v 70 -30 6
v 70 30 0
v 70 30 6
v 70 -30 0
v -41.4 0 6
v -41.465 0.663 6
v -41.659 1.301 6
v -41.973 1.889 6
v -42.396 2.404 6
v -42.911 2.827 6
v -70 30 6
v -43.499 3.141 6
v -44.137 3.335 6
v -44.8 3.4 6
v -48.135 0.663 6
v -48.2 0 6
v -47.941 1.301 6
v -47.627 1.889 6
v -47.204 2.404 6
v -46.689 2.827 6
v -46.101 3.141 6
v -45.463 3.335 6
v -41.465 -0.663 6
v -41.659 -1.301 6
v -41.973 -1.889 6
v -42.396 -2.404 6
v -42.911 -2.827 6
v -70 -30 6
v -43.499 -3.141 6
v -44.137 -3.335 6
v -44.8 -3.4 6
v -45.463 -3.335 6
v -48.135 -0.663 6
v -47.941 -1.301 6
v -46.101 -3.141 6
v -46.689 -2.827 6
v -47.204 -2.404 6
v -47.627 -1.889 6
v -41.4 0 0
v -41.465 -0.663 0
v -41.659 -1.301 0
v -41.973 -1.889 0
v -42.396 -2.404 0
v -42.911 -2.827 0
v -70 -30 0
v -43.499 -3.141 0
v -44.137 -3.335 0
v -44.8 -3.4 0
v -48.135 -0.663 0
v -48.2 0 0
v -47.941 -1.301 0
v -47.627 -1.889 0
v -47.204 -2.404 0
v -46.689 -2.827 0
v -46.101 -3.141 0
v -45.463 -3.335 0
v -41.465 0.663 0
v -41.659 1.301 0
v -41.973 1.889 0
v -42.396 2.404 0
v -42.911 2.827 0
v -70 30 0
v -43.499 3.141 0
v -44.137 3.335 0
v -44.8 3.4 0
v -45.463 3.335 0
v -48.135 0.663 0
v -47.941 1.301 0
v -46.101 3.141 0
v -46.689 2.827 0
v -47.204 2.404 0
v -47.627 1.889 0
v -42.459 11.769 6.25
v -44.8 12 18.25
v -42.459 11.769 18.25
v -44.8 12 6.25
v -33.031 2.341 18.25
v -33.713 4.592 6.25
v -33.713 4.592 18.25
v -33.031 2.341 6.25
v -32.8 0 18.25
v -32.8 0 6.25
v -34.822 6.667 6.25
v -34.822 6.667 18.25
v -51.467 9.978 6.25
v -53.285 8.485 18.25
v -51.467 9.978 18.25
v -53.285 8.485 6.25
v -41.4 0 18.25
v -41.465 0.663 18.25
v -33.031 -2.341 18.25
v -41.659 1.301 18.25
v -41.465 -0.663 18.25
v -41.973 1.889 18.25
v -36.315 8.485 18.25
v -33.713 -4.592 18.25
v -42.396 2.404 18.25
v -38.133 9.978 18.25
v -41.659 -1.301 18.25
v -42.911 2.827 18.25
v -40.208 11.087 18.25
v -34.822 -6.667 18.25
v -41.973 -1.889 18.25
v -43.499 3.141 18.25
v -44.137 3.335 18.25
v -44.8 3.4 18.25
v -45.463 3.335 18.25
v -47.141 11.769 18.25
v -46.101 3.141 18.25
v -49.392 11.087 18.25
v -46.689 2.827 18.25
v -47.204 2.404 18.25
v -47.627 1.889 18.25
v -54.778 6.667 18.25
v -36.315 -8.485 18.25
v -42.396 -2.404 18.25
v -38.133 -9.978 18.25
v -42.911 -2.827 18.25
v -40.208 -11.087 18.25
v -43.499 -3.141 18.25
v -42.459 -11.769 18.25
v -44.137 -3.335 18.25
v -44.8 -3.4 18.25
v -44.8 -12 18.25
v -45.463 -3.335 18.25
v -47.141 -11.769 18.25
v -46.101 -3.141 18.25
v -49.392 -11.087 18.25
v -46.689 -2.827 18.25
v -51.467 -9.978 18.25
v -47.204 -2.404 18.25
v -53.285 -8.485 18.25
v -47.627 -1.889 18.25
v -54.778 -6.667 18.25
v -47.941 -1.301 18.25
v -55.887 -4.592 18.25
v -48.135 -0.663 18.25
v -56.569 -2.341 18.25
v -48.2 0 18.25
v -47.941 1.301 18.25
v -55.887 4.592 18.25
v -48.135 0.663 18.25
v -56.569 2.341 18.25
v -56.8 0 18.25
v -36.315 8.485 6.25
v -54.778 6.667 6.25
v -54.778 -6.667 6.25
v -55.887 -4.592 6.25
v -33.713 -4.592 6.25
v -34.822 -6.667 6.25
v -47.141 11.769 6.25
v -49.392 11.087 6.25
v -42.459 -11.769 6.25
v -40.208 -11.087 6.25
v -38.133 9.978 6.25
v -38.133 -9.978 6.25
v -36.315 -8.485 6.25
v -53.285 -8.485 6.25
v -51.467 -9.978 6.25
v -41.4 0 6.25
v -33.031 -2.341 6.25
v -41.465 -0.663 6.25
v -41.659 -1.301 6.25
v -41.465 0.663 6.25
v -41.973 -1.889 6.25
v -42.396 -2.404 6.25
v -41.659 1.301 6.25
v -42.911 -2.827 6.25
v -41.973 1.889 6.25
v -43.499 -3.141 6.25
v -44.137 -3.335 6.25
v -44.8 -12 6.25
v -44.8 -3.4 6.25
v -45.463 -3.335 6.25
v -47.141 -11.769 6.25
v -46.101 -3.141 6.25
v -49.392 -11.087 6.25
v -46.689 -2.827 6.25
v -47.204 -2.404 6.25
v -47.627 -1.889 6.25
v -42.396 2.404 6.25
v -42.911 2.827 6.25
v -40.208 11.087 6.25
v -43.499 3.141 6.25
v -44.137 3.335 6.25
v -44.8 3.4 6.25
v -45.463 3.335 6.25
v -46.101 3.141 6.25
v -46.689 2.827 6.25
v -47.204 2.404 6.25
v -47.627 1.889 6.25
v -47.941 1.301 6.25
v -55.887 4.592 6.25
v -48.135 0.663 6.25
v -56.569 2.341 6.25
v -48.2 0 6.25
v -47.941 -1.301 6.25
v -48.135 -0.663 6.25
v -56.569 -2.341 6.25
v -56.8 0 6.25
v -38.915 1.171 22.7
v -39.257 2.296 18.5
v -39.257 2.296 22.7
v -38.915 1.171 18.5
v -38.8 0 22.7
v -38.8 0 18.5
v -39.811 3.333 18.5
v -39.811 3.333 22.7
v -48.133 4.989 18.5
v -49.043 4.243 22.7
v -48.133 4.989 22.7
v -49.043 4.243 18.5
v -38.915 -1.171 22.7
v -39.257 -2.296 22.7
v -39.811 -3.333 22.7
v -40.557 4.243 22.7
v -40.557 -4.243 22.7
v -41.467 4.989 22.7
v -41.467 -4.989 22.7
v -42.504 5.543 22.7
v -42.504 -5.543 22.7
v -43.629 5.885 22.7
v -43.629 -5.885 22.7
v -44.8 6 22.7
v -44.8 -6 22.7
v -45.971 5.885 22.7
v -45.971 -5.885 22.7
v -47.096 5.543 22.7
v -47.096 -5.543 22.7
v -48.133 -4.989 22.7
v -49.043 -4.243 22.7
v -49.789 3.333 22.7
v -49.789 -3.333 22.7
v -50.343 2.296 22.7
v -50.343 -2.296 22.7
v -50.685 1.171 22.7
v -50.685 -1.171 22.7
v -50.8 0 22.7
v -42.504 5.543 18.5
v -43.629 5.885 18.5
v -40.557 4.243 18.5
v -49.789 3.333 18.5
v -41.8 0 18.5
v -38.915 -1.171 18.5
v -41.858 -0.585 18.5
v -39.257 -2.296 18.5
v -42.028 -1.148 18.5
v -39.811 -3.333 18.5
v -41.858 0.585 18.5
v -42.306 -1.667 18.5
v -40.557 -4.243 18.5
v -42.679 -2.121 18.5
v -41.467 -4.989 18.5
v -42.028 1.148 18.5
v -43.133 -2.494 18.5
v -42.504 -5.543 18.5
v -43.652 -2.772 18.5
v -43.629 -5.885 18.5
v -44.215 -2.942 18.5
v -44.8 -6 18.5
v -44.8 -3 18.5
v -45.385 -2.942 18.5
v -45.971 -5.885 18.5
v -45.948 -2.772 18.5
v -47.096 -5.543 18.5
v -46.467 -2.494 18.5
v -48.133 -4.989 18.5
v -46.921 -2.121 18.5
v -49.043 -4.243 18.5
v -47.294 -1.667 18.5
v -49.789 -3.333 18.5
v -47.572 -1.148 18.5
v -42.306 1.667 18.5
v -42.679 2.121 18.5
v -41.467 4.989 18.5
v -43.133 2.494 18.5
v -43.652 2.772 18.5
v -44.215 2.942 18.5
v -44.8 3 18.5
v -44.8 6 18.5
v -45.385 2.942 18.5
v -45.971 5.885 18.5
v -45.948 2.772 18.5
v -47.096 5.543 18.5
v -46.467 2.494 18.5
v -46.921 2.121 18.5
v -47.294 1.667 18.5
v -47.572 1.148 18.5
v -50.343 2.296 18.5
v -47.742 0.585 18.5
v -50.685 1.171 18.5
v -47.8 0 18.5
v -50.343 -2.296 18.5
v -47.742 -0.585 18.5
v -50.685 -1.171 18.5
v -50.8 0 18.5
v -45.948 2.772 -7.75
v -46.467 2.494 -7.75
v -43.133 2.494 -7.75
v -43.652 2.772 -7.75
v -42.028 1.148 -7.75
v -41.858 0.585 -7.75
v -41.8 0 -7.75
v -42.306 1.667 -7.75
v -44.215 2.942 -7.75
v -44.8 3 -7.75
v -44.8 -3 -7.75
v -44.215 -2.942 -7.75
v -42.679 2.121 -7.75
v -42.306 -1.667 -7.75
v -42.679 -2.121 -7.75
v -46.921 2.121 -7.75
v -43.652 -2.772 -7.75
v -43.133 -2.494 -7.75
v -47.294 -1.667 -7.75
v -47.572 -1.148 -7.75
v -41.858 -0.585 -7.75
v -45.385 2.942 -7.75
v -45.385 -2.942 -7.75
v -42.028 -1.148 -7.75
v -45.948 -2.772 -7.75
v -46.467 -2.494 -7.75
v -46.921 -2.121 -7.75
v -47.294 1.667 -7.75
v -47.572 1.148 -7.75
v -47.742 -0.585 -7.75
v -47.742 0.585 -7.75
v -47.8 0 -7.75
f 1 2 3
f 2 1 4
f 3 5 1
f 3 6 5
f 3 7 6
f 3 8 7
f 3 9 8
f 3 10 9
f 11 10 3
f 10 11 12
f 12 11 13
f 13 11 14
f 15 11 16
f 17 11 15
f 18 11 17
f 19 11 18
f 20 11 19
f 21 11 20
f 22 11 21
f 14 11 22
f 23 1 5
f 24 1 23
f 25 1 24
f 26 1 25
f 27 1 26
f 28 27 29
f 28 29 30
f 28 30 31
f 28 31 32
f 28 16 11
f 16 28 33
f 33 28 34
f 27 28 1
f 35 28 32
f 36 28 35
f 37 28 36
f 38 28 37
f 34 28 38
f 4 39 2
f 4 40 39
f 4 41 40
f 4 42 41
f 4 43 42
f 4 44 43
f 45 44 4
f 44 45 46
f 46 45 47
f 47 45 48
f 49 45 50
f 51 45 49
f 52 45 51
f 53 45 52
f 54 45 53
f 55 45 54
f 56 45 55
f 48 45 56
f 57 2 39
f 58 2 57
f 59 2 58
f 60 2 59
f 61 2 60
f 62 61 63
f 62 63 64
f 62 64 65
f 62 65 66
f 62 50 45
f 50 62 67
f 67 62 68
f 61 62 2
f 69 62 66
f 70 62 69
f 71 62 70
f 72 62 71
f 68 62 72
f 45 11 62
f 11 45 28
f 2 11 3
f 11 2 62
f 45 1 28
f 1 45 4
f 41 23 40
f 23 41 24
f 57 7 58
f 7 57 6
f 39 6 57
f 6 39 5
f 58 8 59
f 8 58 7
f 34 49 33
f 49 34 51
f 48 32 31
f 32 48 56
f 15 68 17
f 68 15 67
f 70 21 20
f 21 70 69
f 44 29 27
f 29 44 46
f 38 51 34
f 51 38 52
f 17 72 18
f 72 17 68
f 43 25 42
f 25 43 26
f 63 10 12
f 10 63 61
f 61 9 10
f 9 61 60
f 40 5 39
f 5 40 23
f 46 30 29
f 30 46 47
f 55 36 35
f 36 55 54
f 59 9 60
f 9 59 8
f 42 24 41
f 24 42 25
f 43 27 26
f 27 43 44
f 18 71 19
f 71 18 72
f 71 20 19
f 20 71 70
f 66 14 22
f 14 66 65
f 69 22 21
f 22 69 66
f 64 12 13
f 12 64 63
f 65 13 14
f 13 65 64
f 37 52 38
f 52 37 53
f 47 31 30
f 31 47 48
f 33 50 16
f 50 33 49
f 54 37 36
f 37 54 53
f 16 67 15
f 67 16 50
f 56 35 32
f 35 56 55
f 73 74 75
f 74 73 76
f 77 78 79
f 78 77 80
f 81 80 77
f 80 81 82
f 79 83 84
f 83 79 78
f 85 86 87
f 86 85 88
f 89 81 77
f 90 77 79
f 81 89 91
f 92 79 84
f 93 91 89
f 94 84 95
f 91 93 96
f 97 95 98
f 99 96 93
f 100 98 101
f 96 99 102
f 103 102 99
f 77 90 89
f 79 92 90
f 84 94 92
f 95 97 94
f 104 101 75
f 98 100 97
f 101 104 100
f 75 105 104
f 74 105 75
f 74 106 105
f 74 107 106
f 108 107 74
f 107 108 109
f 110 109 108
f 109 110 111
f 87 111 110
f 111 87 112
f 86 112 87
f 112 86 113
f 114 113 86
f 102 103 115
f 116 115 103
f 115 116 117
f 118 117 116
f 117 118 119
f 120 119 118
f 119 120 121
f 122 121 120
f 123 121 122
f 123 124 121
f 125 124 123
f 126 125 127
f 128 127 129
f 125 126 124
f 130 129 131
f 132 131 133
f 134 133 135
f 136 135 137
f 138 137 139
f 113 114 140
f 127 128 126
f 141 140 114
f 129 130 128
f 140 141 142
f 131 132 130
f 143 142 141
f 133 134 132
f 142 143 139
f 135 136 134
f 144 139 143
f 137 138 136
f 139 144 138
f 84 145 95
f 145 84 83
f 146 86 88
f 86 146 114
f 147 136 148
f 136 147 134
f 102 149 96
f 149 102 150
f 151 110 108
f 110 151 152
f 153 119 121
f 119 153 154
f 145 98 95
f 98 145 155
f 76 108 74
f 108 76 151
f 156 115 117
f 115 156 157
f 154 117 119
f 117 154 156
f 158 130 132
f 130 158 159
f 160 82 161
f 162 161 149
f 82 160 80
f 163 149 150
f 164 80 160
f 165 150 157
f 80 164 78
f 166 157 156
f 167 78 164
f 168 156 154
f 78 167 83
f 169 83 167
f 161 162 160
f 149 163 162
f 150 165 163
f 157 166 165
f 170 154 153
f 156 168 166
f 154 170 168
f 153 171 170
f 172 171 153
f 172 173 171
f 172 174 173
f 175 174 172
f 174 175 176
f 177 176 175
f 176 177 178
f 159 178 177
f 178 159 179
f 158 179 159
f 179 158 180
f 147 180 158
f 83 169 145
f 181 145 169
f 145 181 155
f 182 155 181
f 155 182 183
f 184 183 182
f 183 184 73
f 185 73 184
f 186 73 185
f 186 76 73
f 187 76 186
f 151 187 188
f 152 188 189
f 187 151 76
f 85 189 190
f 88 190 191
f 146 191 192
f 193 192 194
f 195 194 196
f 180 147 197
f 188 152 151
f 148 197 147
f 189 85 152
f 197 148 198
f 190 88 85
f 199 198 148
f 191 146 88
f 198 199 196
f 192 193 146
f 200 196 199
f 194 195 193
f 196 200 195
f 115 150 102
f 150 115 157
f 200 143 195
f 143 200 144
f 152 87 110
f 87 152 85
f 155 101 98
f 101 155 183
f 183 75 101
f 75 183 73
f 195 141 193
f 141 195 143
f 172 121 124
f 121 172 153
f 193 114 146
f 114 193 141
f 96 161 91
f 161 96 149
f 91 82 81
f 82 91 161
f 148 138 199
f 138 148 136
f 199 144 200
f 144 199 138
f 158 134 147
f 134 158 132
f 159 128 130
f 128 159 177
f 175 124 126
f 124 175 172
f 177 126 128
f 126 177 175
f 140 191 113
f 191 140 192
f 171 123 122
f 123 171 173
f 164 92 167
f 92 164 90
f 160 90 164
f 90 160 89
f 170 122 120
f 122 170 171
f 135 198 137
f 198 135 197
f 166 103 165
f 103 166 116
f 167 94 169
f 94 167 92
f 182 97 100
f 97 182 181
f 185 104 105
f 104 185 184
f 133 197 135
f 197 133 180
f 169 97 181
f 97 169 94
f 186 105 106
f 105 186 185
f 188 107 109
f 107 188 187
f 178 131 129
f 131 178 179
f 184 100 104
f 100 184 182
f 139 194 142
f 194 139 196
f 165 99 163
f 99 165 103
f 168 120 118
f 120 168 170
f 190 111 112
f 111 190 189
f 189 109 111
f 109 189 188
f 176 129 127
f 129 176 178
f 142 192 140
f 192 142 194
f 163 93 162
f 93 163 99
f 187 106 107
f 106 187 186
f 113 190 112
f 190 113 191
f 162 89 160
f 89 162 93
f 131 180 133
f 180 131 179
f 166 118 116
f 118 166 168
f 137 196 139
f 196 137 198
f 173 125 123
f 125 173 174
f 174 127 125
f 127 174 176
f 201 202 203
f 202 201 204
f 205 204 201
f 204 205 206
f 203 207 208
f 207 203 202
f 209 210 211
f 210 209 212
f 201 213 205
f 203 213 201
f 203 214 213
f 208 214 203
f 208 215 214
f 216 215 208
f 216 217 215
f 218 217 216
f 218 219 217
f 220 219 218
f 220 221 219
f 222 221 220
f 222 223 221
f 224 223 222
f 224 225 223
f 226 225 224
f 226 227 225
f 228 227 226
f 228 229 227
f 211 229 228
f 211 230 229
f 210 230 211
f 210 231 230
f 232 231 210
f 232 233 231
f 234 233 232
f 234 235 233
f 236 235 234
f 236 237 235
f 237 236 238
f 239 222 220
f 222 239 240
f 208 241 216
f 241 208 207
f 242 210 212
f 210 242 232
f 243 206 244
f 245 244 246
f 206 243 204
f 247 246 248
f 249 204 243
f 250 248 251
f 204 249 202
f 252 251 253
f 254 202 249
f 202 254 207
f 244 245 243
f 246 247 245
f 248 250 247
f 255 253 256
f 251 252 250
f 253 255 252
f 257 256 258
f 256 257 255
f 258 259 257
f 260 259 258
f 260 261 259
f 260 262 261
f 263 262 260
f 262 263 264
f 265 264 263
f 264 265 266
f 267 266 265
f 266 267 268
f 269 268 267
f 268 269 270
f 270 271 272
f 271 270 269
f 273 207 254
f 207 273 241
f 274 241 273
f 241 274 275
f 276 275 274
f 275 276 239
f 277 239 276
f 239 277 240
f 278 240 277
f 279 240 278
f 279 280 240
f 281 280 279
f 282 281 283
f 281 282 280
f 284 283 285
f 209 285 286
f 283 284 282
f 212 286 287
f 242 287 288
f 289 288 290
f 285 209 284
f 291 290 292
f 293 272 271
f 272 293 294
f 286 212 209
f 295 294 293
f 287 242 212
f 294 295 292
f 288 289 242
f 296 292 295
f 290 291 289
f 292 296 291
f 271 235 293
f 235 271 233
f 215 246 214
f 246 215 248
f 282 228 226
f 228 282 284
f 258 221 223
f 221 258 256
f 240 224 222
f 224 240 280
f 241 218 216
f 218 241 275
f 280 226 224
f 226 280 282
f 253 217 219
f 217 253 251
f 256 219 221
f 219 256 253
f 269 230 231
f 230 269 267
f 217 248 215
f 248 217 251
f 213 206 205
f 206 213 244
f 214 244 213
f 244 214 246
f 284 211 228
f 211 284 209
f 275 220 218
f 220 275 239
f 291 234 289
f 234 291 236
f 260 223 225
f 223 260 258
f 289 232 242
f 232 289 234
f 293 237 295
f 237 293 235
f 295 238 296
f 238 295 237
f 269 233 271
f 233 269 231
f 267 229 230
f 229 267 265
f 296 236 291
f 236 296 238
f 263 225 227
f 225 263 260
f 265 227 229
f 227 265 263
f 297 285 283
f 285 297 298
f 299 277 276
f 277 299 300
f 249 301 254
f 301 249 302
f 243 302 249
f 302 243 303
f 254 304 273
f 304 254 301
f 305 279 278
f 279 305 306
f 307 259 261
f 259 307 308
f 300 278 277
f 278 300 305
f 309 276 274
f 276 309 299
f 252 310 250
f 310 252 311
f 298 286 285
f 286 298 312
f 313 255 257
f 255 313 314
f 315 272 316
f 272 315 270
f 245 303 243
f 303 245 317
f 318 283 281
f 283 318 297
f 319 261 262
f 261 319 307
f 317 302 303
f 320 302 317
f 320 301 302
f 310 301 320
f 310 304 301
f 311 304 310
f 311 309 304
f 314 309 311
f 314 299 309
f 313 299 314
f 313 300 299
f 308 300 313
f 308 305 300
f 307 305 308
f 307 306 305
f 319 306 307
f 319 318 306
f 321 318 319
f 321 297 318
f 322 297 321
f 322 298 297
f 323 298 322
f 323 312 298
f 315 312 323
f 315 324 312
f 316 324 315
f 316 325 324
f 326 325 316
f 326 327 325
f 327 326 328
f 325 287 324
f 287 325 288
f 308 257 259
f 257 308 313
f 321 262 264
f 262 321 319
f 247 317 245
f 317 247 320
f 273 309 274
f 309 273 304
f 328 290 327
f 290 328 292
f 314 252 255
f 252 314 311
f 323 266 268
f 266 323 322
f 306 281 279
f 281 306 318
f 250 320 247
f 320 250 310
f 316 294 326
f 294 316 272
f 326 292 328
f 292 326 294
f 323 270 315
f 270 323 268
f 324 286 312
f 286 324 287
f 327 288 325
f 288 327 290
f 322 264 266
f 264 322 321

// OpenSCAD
$fn = 32;

// ------------------------------------------------------------------------
// Standoff columns: 1 d24 standoffs, bolts d6
// Every part is its own module, assembly() places them once.
// ------------------------------------------------------------------------

// --- part 1 ---
module base_plate() {
  difference() {
    translate([-70, -30, 0]) cube([140, 60, 6]);
    translate([-44.8, 0, -1]) cylinder(h = 8, d = 6.8);
  }
}

// --- part 2 ---
module spacer() {
  difference() {
      translate([0, 0, 0]) cylinder(h = 12, d = 24);
      translate([0, 0, -1]) cylinder(h = 14, d = 6.8);
    }
}

// --- part 3 ---
module bolt() {
  cylinder(h = 4.2, d = 12);
  translate([0, 0, -26.25]) cylinder(h = 26.25, d = 6);
}

// --- assembly ---
module assembly() {
  translate([0, 0, 0]) rotate([0, 0, 0]) base_plate();
  translate([-44.8, 0, 6.25]) rotate([0, 0, 0]) spacer();
  translate([-44.8, 0, 18.5]) rotate([0, 0, 0]) bolt();
}

assembly();
